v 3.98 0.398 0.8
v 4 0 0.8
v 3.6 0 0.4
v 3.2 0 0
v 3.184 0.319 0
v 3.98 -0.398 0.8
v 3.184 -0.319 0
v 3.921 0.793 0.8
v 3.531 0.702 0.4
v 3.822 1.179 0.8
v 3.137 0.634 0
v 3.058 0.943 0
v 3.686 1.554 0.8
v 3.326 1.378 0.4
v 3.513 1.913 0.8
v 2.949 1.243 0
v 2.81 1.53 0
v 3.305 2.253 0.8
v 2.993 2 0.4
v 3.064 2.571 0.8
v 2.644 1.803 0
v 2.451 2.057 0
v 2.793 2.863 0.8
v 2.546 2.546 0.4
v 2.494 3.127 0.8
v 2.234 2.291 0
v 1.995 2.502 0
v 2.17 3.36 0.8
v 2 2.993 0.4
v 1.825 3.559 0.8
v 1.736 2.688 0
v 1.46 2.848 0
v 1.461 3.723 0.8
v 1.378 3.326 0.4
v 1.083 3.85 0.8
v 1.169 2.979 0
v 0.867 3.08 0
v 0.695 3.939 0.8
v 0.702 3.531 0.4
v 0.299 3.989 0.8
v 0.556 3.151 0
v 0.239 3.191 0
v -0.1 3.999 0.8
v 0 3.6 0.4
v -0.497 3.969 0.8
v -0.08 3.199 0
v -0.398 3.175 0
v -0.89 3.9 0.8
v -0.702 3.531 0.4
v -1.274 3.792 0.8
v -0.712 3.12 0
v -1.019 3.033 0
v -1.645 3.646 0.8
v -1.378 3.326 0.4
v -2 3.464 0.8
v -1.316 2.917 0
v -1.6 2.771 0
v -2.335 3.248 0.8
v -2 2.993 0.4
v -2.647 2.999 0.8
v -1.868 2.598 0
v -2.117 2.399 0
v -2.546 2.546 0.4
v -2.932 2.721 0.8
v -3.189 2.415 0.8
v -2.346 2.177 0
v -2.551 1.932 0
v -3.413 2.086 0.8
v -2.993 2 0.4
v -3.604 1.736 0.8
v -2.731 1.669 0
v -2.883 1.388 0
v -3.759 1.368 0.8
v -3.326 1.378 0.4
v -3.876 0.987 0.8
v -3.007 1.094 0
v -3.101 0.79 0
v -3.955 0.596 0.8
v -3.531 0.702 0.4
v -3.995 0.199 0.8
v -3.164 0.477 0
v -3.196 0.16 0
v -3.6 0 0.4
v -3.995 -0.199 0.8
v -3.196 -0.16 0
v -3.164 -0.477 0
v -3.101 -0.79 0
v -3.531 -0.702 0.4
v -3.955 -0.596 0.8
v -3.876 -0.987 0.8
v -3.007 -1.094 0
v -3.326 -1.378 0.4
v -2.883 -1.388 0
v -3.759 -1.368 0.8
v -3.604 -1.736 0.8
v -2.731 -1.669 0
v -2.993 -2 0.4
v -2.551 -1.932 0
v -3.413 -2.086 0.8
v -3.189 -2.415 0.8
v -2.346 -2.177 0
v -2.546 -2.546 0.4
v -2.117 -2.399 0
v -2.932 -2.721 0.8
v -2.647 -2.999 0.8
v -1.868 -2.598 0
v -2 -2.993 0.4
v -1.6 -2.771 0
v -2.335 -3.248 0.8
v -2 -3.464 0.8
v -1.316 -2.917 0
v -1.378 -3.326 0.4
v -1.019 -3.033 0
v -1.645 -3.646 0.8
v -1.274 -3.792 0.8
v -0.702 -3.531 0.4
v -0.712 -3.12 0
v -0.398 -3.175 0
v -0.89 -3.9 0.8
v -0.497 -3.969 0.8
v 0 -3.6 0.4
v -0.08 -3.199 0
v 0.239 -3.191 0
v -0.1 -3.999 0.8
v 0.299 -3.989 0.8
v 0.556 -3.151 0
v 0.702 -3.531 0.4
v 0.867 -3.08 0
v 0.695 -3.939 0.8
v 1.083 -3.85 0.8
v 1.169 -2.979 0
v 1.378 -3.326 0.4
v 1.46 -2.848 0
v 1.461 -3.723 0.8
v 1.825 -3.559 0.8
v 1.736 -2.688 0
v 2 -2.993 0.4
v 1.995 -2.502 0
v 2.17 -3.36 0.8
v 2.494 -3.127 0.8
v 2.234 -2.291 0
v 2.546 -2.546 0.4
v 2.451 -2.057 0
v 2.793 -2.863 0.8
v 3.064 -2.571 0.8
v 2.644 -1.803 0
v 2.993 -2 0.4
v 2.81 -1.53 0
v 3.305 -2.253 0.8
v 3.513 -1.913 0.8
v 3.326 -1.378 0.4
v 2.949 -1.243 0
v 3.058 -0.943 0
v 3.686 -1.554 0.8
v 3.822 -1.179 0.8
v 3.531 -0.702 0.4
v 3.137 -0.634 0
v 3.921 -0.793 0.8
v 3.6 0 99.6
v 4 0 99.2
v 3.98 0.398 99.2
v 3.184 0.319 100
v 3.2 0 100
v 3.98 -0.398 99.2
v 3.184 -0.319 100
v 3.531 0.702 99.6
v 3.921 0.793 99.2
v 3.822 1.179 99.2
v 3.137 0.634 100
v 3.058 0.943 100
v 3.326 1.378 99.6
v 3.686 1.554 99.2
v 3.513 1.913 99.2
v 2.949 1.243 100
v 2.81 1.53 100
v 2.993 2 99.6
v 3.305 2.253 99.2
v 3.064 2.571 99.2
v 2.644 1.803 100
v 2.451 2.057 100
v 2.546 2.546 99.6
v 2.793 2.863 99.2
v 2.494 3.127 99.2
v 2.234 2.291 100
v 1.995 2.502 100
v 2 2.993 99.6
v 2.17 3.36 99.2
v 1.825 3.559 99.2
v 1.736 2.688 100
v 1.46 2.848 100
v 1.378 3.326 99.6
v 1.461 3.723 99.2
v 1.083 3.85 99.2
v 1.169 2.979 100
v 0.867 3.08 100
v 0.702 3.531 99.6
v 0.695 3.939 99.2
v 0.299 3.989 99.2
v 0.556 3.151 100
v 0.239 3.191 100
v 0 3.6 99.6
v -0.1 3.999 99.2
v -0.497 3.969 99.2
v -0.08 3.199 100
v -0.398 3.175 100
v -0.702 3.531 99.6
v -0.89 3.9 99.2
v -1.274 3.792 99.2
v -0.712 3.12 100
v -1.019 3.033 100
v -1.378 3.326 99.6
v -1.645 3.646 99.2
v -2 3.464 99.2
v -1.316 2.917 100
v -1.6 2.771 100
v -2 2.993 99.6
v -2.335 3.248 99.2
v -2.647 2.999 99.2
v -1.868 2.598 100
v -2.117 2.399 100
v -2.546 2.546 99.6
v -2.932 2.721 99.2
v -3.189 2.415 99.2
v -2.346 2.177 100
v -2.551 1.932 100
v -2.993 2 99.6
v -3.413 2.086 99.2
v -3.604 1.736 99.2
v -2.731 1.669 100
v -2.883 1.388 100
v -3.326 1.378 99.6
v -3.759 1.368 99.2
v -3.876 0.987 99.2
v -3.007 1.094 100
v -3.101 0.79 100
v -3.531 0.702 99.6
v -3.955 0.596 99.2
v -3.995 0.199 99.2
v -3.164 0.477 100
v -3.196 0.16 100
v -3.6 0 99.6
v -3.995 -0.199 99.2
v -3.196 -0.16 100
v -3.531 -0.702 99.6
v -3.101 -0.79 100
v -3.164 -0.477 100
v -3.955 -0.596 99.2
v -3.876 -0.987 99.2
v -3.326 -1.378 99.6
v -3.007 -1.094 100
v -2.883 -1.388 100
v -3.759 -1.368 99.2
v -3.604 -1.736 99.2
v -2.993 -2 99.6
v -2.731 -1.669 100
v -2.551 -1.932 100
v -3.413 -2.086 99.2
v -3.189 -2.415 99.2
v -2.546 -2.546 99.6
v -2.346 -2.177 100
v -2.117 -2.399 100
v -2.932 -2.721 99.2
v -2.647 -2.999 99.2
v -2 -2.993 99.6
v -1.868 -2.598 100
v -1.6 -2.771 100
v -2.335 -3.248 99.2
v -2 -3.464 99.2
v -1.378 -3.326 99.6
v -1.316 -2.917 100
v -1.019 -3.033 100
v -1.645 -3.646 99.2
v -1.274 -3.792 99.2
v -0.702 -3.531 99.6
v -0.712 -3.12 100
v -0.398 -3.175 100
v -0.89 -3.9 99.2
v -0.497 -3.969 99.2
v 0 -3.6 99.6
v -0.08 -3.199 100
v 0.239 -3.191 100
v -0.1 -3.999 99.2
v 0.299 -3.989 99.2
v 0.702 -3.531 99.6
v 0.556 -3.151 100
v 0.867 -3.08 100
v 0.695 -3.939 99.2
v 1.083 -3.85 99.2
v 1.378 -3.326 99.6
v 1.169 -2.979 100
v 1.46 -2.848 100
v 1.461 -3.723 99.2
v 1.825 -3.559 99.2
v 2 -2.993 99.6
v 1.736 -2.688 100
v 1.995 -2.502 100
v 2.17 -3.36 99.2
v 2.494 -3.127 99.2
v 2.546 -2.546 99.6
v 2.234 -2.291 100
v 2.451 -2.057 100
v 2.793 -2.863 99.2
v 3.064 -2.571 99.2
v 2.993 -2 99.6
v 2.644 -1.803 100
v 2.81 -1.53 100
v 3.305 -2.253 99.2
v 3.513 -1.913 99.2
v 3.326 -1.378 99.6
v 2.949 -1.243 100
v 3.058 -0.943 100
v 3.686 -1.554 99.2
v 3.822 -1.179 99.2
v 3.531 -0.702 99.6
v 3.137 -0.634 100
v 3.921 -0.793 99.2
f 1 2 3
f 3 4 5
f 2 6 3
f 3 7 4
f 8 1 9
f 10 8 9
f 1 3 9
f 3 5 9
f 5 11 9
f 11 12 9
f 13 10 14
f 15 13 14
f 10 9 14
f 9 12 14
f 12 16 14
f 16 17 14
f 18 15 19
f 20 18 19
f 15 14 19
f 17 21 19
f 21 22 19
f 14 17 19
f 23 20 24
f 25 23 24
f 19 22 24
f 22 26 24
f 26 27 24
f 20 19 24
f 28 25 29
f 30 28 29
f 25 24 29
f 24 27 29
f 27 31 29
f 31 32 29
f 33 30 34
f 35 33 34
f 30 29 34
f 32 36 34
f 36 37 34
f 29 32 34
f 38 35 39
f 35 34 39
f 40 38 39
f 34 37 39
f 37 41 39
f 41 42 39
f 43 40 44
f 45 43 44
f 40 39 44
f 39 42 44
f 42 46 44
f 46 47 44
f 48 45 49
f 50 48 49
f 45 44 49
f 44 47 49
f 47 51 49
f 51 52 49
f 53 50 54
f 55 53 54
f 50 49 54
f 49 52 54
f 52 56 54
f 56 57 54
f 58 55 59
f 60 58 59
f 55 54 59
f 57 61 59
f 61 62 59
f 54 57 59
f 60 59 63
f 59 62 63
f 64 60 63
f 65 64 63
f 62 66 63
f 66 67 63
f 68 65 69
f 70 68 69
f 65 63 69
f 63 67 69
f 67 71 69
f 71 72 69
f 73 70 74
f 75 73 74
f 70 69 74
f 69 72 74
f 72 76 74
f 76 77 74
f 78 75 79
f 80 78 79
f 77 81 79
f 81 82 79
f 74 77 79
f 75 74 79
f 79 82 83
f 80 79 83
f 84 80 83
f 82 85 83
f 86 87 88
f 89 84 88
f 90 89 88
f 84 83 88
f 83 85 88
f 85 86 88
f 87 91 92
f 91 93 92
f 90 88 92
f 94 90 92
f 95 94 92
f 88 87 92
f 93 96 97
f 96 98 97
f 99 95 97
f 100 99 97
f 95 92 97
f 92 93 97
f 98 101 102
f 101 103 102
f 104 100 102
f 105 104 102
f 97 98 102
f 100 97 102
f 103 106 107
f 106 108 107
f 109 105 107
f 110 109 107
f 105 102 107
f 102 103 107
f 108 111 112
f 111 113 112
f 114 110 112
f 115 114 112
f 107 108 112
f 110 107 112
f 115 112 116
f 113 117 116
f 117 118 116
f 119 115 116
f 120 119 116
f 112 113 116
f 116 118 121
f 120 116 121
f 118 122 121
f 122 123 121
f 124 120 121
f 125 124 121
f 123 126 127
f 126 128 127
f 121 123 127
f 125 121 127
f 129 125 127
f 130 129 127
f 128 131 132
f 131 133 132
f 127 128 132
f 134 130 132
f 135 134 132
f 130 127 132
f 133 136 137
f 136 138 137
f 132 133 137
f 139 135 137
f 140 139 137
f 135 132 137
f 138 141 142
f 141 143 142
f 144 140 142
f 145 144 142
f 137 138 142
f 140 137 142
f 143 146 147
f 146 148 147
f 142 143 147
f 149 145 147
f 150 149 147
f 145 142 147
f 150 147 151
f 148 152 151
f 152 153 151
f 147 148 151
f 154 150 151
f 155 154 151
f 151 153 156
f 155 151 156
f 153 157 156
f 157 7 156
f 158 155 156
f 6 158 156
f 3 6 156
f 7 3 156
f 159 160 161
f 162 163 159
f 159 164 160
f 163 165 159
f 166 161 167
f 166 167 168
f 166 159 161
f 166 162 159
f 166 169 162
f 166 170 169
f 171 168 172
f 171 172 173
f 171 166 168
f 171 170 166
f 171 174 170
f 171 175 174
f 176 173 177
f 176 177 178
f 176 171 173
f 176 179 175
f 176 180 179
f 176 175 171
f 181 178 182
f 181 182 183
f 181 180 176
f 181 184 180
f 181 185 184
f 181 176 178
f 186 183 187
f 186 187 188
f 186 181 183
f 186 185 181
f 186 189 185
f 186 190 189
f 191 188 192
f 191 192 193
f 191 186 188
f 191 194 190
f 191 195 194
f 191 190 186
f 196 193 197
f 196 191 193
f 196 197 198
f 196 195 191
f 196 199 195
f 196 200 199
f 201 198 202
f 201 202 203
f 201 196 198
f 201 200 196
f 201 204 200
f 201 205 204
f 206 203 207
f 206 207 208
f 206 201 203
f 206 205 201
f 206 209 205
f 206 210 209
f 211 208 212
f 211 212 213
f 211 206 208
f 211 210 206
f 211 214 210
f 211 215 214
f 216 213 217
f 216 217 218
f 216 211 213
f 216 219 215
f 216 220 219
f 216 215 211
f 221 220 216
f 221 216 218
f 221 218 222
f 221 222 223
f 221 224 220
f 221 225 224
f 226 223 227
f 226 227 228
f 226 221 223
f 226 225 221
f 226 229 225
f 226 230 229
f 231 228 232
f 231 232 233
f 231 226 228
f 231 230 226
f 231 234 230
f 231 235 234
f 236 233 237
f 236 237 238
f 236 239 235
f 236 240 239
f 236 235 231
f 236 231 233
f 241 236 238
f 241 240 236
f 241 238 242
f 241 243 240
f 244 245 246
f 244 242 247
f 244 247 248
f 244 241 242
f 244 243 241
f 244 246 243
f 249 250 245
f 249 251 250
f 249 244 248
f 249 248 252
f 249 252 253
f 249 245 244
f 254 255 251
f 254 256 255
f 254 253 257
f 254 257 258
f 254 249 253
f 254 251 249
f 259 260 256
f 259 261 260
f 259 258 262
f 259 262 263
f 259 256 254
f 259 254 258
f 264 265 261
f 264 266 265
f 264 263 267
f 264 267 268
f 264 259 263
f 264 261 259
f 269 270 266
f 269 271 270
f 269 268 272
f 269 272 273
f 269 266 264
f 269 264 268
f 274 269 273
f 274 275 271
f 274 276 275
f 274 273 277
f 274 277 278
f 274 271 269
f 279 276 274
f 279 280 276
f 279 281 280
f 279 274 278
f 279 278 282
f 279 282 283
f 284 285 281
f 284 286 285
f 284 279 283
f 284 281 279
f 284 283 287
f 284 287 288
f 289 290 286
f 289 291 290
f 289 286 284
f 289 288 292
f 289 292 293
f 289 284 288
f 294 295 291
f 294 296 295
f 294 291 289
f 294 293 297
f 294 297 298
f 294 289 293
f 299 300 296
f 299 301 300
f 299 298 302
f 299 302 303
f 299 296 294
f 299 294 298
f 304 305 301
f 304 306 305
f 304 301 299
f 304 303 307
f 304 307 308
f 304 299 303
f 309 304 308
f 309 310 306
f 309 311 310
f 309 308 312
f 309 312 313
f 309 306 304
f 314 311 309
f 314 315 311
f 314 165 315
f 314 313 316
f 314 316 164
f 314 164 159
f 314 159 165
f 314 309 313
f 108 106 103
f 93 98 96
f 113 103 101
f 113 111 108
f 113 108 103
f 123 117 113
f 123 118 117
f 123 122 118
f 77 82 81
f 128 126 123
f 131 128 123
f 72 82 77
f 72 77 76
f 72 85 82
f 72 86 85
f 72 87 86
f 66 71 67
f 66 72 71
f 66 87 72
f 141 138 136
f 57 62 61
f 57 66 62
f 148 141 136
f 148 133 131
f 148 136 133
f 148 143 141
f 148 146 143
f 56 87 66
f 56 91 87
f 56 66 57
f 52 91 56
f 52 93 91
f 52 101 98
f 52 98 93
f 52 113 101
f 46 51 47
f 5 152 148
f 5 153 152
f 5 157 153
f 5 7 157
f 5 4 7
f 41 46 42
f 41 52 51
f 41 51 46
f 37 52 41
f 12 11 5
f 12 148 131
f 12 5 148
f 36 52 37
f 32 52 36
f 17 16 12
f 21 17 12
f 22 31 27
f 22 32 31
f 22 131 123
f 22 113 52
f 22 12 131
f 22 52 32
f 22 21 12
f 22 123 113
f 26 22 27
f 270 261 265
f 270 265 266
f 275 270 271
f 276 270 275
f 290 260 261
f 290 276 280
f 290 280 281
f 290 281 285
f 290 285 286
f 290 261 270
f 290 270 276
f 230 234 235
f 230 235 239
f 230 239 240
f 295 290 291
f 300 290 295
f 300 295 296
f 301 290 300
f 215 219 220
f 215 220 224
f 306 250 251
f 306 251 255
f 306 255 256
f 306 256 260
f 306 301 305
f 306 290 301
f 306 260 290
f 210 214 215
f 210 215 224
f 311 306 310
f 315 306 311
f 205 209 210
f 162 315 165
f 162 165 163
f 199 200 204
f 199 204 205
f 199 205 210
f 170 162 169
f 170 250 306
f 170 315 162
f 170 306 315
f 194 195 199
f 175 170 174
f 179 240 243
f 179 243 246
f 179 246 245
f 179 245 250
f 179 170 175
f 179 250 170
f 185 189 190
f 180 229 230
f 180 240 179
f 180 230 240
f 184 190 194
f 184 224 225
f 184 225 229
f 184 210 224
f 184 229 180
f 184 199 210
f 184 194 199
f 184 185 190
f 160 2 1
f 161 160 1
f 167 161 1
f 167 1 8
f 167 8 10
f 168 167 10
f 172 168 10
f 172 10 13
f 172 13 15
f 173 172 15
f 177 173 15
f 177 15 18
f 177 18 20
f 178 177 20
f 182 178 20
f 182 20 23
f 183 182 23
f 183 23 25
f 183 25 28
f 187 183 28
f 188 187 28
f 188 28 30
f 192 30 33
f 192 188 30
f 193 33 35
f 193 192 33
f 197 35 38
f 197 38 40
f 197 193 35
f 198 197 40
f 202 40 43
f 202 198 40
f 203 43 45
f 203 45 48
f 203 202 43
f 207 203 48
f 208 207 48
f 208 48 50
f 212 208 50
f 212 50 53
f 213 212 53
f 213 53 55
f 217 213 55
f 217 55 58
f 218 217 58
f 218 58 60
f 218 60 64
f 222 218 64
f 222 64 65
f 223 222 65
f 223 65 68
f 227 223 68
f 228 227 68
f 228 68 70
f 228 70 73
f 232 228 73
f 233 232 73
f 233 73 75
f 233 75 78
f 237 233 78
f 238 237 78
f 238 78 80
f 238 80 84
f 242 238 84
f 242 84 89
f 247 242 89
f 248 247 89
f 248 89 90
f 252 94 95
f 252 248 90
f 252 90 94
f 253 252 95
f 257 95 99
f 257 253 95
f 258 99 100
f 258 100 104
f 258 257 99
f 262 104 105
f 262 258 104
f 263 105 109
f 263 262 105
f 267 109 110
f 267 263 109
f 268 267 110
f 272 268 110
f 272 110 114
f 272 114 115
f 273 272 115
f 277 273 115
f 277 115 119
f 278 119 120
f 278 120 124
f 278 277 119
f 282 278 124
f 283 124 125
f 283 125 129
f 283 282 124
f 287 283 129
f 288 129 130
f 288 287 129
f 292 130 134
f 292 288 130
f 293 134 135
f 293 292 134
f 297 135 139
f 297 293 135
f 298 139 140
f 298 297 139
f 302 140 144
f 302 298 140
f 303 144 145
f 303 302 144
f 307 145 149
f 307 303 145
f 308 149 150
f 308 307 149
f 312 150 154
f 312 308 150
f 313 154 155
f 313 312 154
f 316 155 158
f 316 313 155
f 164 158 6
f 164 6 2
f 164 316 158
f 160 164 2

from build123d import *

# Parameters (mm, degrees)
SKETCH1_R               = 4
EXTRUDE1_DEPTH          = 100
CHAMFER1_SIZE           = 0.8
SKETCH2_W               = 103.982490854
SKETCH2_H               = 8.719679173
CUT_EXTRUDE1_DEPTH      = 5
CUT_EXTRUDE1_DEPTH_BACK = 5
CHAMFER2_SIZE           = 0.8


with BuildPart() as part:
    # Sketch1 → Extrude1 (new body, symmetric)
    with BuildSketch(Plane.XY):
        Circle(SKETCH1_R)
    extrude(amount=EXTRUDE1_DEPTH, both=True)

    # Chamfer1
    chamfer1_edges = [part.edges().sort_by_distance(p)[0] for p in [
        (-4, 0, -100),
        (-4, 0, 100),
    ]]
    chamfer(chamfer1_edges, length=CHAMFER1_SIZE)

    # Sketch2 → Cut-Extrude1 (cut, two sides)
    with BuildSketch(Plane(origin=(0, 0, 0), x_dir=(0, 0, -1), z_dir=(1, 0, 0))) as cut_extrude1_sk:
        with Locations((51.991245427, -0.359839587)):
            Rectangle(SKETCH2_W, SKETCH2_H)
    extrude(amount=CUT_EXTRUDE1_DEPTH, mode=Mode.SUBTRACT)
    extrude(cut_extrude1_sk.sketch, amount=-CUT_EXTRUDE1_DEPTH_BACK, mode=Mode.SUBTRACT)

    # Chamfer2
    chamfer2_edges = [part.edges().sort_by_distance(p)[0] for p in [
        (-4, 0, 0),
    ]]
    chamfer(chamfer2_edges, length=CHAMFER2_SIZE)


solid = part.part
